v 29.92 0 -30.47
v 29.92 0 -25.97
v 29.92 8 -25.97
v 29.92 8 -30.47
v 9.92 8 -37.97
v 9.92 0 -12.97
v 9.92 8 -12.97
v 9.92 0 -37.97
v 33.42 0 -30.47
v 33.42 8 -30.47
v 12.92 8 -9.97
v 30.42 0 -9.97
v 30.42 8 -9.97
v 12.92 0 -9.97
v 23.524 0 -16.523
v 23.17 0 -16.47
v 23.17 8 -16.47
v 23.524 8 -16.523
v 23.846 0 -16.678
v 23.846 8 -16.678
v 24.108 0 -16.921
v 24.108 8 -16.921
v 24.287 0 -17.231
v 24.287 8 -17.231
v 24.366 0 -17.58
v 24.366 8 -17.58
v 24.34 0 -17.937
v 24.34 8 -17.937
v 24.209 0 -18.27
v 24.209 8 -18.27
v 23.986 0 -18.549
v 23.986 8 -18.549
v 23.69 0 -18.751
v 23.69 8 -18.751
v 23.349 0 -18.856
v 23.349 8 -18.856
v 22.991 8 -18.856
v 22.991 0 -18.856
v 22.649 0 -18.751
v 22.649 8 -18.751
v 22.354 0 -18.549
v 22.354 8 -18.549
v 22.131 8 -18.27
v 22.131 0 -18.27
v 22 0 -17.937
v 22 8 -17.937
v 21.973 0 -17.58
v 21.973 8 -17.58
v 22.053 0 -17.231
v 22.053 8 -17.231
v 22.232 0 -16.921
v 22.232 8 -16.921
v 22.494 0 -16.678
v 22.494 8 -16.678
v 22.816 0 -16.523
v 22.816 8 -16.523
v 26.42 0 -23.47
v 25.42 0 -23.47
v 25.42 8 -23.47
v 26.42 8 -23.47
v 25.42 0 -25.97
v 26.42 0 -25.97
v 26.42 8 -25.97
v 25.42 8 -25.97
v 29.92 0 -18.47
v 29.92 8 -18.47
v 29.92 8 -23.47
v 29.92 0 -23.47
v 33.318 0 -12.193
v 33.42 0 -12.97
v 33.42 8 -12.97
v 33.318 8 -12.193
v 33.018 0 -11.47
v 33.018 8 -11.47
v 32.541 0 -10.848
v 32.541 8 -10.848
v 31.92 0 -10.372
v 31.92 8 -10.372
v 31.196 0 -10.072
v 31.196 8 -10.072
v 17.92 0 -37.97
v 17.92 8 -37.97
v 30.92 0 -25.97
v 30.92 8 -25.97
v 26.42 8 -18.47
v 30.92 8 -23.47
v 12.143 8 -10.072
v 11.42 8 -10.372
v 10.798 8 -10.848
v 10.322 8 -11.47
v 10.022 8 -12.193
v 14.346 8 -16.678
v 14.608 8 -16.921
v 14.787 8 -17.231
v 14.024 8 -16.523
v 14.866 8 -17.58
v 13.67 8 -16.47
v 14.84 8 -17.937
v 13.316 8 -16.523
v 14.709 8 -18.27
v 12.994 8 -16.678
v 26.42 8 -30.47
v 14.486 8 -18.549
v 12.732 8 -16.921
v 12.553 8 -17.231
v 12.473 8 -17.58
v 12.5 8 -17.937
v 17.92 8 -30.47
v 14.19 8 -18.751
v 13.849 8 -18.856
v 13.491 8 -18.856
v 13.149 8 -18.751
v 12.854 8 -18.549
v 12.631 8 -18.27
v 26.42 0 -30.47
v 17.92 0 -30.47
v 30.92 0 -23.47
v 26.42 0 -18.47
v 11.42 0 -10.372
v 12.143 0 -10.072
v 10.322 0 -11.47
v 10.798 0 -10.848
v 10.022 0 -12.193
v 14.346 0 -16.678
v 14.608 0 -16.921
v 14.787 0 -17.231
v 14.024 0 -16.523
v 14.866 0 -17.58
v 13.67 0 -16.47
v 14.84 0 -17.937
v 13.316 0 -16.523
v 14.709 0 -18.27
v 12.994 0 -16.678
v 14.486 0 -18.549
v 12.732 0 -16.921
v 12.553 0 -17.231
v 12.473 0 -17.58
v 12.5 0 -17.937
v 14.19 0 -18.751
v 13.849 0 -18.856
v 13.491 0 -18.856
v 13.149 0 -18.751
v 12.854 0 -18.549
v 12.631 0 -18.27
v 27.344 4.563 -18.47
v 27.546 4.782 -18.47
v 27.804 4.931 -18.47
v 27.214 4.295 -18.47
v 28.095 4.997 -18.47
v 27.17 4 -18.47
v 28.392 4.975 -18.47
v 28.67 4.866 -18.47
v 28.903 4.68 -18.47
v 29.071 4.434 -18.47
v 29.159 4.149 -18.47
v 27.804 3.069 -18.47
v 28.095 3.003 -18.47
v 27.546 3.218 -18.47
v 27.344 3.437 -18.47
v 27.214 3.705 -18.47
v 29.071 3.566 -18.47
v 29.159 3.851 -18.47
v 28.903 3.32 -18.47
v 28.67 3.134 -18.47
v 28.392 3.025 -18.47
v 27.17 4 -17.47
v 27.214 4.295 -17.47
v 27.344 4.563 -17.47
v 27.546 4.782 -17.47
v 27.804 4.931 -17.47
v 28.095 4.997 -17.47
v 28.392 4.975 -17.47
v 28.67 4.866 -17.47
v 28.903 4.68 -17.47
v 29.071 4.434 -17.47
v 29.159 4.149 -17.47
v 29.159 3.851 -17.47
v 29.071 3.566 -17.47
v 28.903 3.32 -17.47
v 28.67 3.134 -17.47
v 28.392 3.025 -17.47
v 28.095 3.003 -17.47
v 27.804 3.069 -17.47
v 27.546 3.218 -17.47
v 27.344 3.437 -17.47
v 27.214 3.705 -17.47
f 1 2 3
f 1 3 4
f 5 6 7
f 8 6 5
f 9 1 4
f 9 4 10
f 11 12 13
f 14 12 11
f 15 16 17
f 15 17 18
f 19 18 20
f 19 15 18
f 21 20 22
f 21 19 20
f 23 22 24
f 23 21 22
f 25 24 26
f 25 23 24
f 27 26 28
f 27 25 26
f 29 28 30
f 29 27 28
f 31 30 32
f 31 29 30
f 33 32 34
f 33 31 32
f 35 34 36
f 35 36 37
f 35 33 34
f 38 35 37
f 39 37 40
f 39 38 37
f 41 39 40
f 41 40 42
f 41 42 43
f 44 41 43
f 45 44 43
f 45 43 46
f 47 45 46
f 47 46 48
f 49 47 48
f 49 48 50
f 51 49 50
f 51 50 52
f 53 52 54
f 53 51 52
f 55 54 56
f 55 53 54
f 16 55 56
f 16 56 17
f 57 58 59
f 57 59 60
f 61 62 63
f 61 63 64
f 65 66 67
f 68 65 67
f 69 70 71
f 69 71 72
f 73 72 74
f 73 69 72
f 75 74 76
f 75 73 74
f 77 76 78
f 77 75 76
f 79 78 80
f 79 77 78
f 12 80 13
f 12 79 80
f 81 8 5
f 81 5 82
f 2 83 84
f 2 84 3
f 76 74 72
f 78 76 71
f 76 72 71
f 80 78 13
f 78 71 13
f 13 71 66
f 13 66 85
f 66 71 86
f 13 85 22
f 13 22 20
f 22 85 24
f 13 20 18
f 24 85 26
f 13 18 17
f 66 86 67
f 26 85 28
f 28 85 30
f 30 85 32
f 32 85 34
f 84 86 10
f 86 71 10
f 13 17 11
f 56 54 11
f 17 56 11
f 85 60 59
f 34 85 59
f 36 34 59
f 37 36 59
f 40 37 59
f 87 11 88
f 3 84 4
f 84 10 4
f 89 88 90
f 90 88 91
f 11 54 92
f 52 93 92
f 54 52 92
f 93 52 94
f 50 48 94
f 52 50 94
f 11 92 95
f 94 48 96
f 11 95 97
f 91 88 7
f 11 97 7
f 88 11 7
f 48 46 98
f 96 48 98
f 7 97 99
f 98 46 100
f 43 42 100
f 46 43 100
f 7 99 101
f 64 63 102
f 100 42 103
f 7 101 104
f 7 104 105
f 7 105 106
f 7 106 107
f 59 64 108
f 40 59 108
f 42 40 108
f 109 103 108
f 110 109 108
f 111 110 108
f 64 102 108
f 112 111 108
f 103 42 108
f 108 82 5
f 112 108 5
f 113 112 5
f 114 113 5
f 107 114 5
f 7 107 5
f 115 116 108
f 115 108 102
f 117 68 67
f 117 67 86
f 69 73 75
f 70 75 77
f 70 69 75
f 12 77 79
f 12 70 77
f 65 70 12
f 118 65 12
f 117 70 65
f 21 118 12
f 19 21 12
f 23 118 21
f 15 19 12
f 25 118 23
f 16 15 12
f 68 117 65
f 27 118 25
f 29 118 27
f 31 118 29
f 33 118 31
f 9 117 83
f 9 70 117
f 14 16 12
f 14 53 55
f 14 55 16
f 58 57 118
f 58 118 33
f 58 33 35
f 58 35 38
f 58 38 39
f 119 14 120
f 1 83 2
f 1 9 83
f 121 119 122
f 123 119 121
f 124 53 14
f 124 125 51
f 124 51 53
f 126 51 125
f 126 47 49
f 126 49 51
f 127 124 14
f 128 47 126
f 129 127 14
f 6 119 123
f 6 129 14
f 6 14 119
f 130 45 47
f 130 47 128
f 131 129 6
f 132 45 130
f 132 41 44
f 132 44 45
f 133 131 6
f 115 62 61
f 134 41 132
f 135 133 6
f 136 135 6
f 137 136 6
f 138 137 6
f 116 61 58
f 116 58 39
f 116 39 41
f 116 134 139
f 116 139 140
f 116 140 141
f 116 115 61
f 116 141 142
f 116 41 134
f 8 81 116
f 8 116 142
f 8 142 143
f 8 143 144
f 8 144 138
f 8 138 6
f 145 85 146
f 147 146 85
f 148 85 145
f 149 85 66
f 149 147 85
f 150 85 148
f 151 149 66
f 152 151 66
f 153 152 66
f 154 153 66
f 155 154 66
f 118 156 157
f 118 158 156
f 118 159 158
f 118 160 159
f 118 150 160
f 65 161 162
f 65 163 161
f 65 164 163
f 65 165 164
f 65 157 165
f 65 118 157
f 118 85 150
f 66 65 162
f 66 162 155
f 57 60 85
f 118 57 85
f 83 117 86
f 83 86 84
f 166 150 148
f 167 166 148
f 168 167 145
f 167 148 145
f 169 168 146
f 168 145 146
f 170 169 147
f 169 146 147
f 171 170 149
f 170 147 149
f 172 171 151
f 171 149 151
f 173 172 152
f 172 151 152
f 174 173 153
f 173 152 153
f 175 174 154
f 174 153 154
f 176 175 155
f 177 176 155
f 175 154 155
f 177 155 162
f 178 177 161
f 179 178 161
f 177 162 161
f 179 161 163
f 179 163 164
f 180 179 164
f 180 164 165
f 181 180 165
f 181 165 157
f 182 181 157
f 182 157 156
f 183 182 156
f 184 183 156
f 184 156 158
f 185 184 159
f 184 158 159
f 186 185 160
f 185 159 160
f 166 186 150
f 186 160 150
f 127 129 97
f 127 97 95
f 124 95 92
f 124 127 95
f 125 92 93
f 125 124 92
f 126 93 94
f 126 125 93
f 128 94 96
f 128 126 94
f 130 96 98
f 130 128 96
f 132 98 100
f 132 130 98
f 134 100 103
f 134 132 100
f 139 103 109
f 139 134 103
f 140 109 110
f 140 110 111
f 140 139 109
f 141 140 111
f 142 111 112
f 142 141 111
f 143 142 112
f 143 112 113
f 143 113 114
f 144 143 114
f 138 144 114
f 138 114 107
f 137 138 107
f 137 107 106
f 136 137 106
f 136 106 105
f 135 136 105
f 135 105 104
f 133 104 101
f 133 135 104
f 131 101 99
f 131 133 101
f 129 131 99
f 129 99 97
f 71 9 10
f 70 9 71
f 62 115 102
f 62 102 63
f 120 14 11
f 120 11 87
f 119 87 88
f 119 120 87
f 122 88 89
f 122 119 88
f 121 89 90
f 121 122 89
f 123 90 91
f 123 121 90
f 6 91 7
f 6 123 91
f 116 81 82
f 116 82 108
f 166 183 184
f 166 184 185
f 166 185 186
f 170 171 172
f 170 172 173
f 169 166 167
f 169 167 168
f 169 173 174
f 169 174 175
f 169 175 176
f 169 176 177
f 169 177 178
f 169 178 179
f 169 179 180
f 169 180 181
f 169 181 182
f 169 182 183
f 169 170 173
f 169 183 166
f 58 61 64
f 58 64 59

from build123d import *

# Parameters (mm, degrees)
SKETCH1_R      = 1.2
EXTRUDE1_DEPTH = 8
SKETCH2_R      = 1
EXTRUDE2_DEPTH = 1


with BuildPart() as part:
    # Sketch1 → Extrude1 (new body)
    with BuildSketch(Plane(origin=(0, 0, 0), x_dir=(1, 0, 0), z_dir=(0, 1, 0))):
        with BuildLine():
            Line((26.419805568, 30.469633485), (26.419805568, 25.969633485))
            Line((26.419805568, 25.969633485), (25.419805568, 25.969633485))
            Line((25.419805568, 25.969633485), (25.419805568, 23.469633485))
            Line((25.419805568, 23.469633485), (26.419805568, 23.469633485))
            Line((26.419805568, 23.469633485), (26.419805568, 18.469633485))
            Line((26.419805568, 18.469633485), (29.919805568, 18.469633485))
            Line((29.919805568, 18.469633485), (29.919805568, 23.469633485))
            Line((29.919805568, 23.469633485), (30.919805568, 23.469633485))
            Line((30.919805568, 23.469633485), (30.919805568, 25.969633485))
            Line((30.919805568, 25.969633485), (29.919805568, 25.969633485))
            Line((29.919805568, 25.969633485), (29.919805568, 30.469633485))
            Line((29.919805568, 30.469633485), (33.419805568, 30.469633485))
            Line((33.419805568, 30.469633485), (33.419805568, 12.969633485))
            ThreePointArc((33.419805568, 12.969633485), (32.541125911, 10.848313142), (30.419805568, 9.969633485))
            Line((30.419805568, 9.969633485), (12.919805568, 9.969633485))
            ThreePointArc((12.919805568, 9.969633485), (10.798485224, 10.848313142), (9.919805568, 12.969633485))
            Line((9.919805568, 12.969633485), (9.919805568, 30.469633485))
            Line((9.919805568, 30.469633485), (9.919805568, 37.969633485))
            Line((9.919805568, 37.969633485), (17.919805568, 37.969633485))
            Line((17.919805568, 37.969633485), (17.919805568, 30.469633485))
            Line((17.919805568, 30.469633485), (26.419805568, 30.469633485))
        make_face()
        with Locations(Location((23.169805568, 17.669633485, 0), (0, 0, 270))):
            Circle(SKETCH1_R, mode=Mode.SUBTRACT)
        with Locations(Location((13.669805568, 17.669633485, 0), (0, 0, 270))):
            Circle(SKETCH1_R, mode=Mode.SUBTRACT)
    extrude(amount=EXTRUDE1_DEPTH)

    # Sketch2 → Extrude2 (cut)
    with BuildSketch(Plane(origin=(0, 0, -18.469633485), x_dir=(-1, 0, 0), z_dir=(0, 0, -1))):
        with Locations((-28.169805568, 4)):
            Circle(SKETCH2_R)
    extrude(amount=-EXTRUDE2_DEPTH, mode=Mode.SUBTRACT)


solid = part.part
